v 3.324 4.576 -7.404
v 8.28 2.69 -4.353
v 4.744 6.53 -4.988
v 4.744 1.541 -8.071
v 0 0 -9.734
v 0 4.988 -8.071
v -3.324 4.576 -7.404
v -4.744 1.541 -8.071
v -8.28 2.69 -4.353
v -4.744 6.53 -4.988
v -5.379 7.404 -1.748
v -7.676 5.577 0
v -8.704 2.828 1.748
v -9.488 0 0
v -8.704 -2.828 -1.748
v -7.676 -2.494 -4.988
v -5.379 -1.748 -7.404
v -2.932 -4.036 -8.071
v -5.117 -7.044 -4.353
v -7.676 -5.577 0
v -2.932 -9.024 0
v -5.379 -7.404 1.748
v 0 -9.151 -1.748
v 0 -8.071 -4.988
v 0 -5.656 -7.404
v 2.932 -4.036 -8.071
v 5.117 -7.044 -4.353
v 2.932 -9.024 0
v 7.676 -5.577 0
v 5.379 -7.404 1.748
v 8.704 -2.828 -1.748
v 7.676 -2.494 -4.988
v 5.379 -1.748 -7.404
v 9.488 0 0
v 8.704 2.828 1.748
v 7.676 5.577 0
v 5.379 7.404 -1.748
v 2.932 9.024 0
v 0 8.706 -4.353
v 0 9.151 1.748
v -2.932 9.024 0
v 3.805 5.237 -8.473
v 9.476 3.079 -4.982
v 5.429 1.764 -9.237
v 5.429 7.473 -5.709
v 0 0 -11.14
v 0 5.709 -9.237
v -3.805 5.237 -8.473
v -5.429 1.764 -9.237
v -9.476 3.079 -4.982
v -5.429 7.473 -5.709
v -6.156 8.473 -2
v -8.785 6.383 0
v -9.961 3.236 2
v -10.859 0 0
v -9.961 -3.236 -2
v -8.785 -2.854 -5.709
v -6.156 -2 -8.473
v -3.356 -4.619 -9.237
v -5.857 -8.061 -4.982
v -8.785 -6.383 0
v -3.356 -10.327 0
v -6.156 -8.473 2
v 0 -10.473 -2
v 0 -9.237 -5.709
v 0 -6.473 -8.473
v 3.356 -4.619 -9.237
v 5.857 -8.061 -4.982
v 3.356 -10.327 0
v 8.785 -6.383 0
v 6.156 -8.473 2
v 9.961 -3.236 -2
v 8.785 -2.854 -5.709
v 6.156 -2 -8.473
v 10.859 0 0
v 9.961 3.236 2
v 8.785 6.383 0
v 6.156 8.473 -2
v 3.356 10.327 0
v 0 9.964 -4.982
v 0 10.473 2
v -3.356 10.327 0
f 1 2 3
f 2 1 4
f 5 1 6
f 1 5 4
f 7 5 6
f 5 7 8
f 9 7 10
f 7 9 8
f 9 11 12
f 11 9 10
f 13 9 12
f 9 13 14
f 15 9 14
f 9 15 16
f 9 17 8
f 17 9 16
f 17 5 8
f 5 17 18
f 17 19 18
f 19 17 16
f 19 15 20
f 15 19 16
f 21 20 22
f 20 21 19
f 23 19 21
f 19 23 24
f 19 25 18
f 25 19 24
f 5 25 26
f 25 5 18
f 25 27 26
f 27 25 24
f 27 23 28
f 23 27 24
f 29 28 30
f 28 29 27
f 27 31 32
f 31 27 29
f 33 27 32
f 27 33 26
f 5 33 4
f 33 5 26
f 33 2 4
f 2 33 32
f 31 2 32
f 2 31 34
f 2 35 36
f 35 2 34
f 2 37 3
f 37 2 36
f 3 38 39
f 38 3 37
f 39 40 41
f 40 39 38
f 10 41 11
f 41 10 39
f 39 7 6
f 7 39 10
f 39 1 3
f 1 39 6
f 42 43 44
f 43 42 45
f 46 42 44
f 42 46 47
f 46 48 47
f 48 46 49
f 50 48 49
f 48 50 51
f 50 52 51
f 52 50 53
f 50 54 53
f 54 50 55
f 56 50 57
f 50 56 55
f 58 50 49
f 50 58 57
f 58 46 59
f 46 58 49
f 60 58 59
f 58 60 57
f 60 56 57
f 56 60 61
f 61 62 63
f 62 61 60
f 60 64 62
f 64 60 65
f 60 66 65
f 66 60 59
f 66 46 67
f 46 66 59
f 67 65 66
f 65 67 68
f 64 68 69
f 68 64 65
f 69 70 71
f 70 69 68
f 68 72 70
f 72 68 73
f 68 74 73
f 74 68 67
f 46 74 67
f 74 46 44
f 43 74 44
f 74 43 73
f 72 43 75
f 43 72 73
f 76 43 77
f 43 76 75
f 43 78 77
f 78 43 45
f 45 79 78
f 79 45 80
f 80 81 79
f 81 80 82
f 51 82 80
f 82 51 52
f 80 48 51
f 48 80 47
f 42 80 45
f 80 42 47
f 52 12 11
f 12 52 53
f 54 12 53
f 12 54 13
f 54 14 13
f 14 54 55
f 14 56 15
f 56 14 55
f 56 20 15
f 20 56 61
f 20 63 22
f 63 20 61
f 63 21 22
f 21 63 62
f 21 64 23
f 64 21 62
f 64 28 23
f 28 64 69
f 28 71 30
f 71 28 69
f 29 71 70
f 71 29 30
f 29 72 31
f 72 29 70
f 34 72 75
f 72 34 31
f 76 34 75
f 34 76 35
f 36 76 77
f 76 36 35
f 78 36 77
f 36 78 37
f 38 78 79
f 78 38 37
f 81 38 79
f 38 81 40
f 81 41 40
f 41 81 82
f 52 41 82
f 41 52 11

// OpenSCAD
module eggshell20mm()
{
	rotate ([0,0,18])
		polyhedron( points = [ [4.575706e+00, 3.324445e+00, -7.403649e+00], [6.529766e+00, 4.744153e+00, -4.988298e+00], [8.706355e+00, -0.000000e+00, -4.353178e+00], [4.988298e+00, 0.000000e+00, -8.071235e+00], [0.000000e+00, 0.000000e+00, -9.734001e+00], [1.541469e+00, 4.744153e+00, -8.071235e+00], [-1.747764e+00, 5.379066e+00, -7.403649e+00], [-4.035618e+00, 2.932048e+00, -8.071235e+00], [-7.043589e+00, 5.117467e+00, -4.353178e+00], [-2.494149e+00, 7.676201e+00, -4.988298e+00], [-2.827942e+00, 8.703511e+00, -1.747764e+00], [-5.577086e+00, 7.676201e+00, -0.000000e+00], [-7.403649e+00, 5.379066e+00, 1.747764e+00], [-9.023915e+00, 2.932048e+00, 8.881784e-16], [-9.151413e+00, 0.000000e+00, -1.747764e+00], [-8.071235e+00, 0.000000e+00, -4.988298e+00], [-5.655884e+00, 0.000000e+00, -7.403649e+00], [-4.035618e+00, -2.932048e+00, -8.071235e+00], [-7.043589e+00, -5.117467e+00, -4.353178e+00], [-9.023915e+00, -2.932048e+00, 8.881784e-16], [-7.403649e+00, -5.379066e+00, 1.747764e+00], [-5.577086e+00, -7.676201e+00, -0.000000e+00], [-2.827942e+00, -8.703511e+00, -1.747764e+00], [-2.494149e+00, -7.676201e+00, -4.988298e+00], [-1.747764e+00, -5.379066e+00, -7.403649e+00], [1.541469e+00, -4.744153e+00, -8.071235e+00], [2.690412e+00, -8.280236e+00, -4.353178e+00], [0.000000e+00, -9.488306e+00, -0.000000e+00], [2.827942e+00, -8.703511e+00, 1.747764e+00], [5.577086e+00, -7.676201e+00, -0.000000e+00], [7.403649e+00, -5.379066e+00, -1.747764e+00], [6.529766e+00, -4.744153e+00, -4.988298e+00], [4.575706e+00, -3.324445e+00, -7.403649e+00], [9.023915e+00, -2.932048e+00, -8.881784e-16], [9.151413e+00, -0.000000e+00, 1.747764e+00], [9.023915e+00, 2.932048e+00, -8.881784e-16], [7.403649e+00, 5.379066e+00, -1.747764e+00], [2.690412e+00, 8.280236e+00, -4.353178e+00], [5.577086e+00, 7.676201e+00, -0.000000e+00], [2.827942e+00, 8.703511e+00, 1.747764e+00], [-0.000000e+00, 9.488306e+00, -0.000000e+00], [5.236642e+00, 3.804643e+00, -8.473064e+00], [7.472955e+00, 5.429420e+00, -5.708830e+00], [9.963940e+00, -0.000000e+00, -4.981970e+00], [5.708830e+00, 0.000000e+00, -9.237080e+00], [-8.881784e-16, 0.000000e+00, -1.114002e+01], [1.764125e+00, 5.429420e+00, -9.237080e+00], [-2.000219e+00, 6.156042e+00, -8.473064e+00], [-4.618540e+00, 3.355566e+00, -9.237080e+00], [-8.060997e+00, 5.856657e+00, -4.981970e+00], [-2.854415e+00, 8.784985e+00, -5.708830e+00], [-3.236423e+00, 9.960685e+00, -2.000219e+00], [-6.382665e+00, 8.784985e+00, -0.000000e+00], [-8.473064e+00, 6.156042e+00, 2.000219e+00], [-1.032737e+01, 3.355566e+00, 8.881784e-16], [-1.047328e+01, 0.000000e+00, -2.000219e+00], [-9.237080e+00, 0.000000e+00, -5.708830e+00], [-6.472845e+00, 0.000000e+00, -8.473064e+00], [-4.618540e+00, -3.355566e+00, -9.237080e+00], [-8.060997e+00, -5.856657e+00, -4.981970e+00], [-1.032737e+01, -3.355566e+00, 8.881784e-16], [-8.473064e+00, -6.156042e+00, 2.000219e+00], [-6.382665e+00, -8.784985e+00, -0.000000e+00], [-3.236423e+00, -9.960685e+00, -2.000219e+00], [-2.854415e+00, -8.784985e+00, -5.708830e+00], [-2.000219e+00, -6.156042e+00, -8.473064e+00], [1.764125e+00, -5.429420e+00, -9.237080e+00], [3.079027e+00, -9.476270e+00, -4.981970e+00], [0.000000e+00, -1.085884e+01, -0.000000e+00], [3.236423e+00, -9.960685e+00, 2.000219e+00], [6.382665e+00, -8.784985e+00, -0.000000e+00], [8.473064e+00, -6.156042e+00, -2.000219e+00], [7.472955e+00, -5.429420e+00, -5.708830e+00], [5.236642e+00, -3.804643e+00, -8.473064e+00], [1.032737e+01, -3.355566e+00, -8.881784e-16], [1.047328e+01, -0.000000e+00, 2.000219e+00], [1.032737e+01, 3.355566e+00, -8.881784e-16], [8.473064e+00, 6.156042e+00, -2.000219e+00], [3.079027e+00, 9.476270e+00, -4.981970e+00], [6.382665e+00, 8.784985e+00, -0.000000e+00], [3.236423e+00, 9.960685e+00, 2.000219e+00], [-0.000000e+00, 1.085884e+01, -0.000000e+00] ], faces = [ [ 1, 2, 3, 0 ] , [ 3, 4, 5, 0 ] , [ 5, 4, 7, 6 ] , [ 7, 8, 9, 6 ] , [ 9, 8, 11, 10 ] , [ 11, 8, 13, 12 ] , [ 13, 8, 15, 14 ] , [ 15, 8, 7, 16 ] , [ 7, 4, 17, 16 ] , [ 17, 18, 15, 16 ] , [ 15, 18, 19, 14 ] , [ 19, 18, 21, 20 ] , [ 21, 18, 23, 22 ] , [ 23, 18, 17, 24 ] , [ 17, 4, 25, 24 ] , [ 25, 26, 23, 24 ] , [ 23, 26, 27, 22 ] , [ 27, 26, 29, 28 ] , [ 29, 26, 31, 30 ] , [ 31, 26, 25, 32 ] , [ 25, 4, 3, 32 ] , [ 3, 2, 31, 32 ] , [ 31, 2, 33, 30 ] , [ 33, 2, 35, 34 ] , [ 35, 2, 1, 36 ] , [ 1, 37, 38, 36 ] , [ 38, 37, 40, 39 ] , [ 40, 37, 9, 10 ] , [ 9, 37, 5, 6 ] , [ 5, 37, 1, 0 ] , [ 44, 43, 42, 41 ] , [ 46, 45, 44, 41 ] , [ 48, 45, 46, 47 ] , [ 50, 49, 48, 47 ] , [ 52, 49, 50, 51 ] , [ 54, 49, 52, 53 ] , [ 56, 49, 54, 55 ] , [ 48, 49, 56, 57 ] , [ 58, 45, 48, 57 ] , [ 56, 59, 58, 57 ] , [ 60, 59, 56, 55 ] , [ 62, 59, 60, 61 ] , [ 64, 59, 62, 63 ] , [ 58, 59, 64, 65 ] , [ 66, 45, 58, 65 ] , [ 64, 67, 66, 65 ] , [ 68, 67, 64, 63 ] , [ 70, 67, 68, 69 ] , [ 72, 67, 70, 71 ] , [ 66, 67, 72, 73 ] , [ 44, 45, 66, 73 ] , [ 72, 43, 44, 73 ] , [ 74, 43, 72, 71 ] , [ 76, 43, 74, 75 ] , [ 42, 43, 76, 77 ] , [ 79, 78, 42, 77 ] , [ 81, 78, 79, 80 ] , [ 50, 78, 81, 51 ] , [ 46, 78, 50, 47 ] , [ 42, 78, 46, 41 ] , [ 52, 51, 10, 11 ] , [ 53, 52, 11, 12 ] , [ 54, 53, 12, 13 ] , [ 55, 54, 13, 14 ] , [ 60, 55, 14, 19 ] , [ 61, 60, 19, 20 ] , [ 62, 61, 20, 21 ] , [ 63, 62, 21, 22 ] , [ 68, 63, 22, 27 ] , [ 69, 68, 27, 28 ] , [ 70, 69, 28, 29 ] , [ 71, 70, 29, 30 ] , [ 74, 71, 30, 33 ] , [ 75, 74, 33, 34 ] , [ 76, 75, 34, 35 ] , [ 77, 76, 35, 36 ] , [ 79, 77, 36, 38 ] , [ 80, 79, 38, 39 ] , [ 81, 80, 39, 40 ] , [ 51, 81, 40, 10 ]  ], convexity = 10);

}


eggshell20mm();
